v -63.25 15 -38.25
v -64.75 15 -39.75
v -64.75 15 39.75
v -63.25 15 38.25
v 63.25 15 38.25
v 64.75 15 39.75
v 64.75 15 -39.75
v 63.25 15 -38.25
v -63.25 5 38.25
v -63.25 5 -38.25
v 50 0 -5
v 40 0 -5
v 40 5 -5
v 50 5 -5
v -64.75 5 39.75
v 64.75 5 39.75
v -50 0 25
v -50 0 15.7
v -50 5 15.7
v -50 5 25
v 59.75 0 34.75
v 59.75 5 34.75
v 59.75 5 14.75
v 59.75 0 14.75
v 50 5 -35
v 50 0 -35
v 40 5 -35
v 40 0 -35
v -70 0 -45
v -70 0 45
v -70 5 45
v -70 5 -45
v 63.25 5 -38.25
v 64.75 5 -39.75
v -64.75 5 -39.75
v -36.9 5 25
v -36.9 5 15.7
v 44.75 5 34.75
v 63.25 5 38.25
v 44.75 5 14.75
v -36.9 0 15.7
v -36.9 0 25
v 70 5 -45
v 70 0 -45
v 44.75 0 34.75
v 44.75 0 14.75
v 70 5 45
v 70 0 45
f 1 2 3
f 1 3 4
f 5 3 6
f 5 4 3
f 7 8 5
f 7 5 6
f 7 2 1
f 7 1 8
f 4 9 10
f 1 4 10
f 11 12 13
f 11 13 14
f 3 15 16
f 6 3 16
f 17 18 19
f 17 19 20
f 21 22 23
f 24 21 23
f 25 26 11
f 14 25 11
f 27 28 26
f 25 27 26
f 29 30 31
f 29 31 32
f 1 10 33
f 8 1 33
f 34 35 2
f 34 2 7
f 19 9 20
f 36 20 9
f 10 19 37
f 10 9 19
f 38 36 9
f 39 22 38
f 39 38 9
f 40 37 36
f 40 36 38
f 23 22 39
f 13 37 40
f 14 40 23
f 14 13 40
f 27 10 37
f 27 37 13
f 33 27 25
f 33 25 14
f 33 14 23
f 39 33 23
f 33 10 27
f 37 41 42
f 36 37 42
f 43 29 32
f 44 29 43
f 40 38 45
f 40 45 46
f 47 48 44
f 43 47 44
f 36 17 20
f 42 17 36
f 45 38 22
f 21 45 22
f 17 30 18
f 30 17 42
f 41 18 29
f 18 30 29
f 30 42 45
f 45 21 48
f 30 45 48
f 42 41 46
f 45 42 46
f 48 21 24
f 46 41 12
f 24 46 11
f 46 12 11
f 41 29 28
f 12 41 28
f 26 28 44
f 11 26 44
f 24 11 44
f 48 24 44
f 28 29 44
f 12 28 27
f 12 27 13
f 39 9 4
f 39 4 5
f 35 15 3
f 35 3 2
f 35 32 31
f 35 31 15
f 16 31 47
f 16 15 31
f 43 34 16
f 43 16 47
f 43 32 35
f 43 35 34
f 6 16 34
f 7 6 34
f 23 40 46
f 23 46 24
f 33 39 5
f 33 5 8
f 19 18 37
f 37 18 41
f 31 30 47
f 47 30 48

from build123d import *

# Parameters (mm, degrees)
CROQUIS1_W              = 140
CROQUIS1_H              = 90
SALIENTE_EXTRUIR1_DEPTH = 5
CROQUIS2_W              = 129.5
CROQUIS2_H              = 79.5
CROQUIS2_W_2            = 126.5
CROQUIS2_H_2            = 76.5
SALIENTE_EXTRUIR2_DEPTH = 10
CROQUIS3_W              = 15
CROQUIS3_H              = 20
CORTAR_EXTRUIR1_DEPTH   = 84.815273071
CROQUIS4_W              = 13.1
CROQUIS4_H              = 9.3
CORTAR_EXTRUIR2_DEPTH   = 85.557672626
CROQUIS5_W              = 10
CROQUIS5_H              = 30
CORTAR_EXTRUIR3_DEPTH   = 85.557672626


with BuildPart() as part:
    # Croquis1 → Saliente-Extruir1 (new body)
    with BuildSketch(Plane(origin=(0, 0, 0), x_dir=(1, 0, 0), z_dir=(0, 1, 0))):
        Rectangle(CROQUIS1_W, CROQUIS1_H)
    extrude(amount=SALIENTE_EXTRUIR1_DEPTH)

    # Croquis2 → Saliente-Extruir2 (add)
    with BuildSketch(Plane(origin=(0, 5, 0), x_dir=(1, 0, 0), z_dir=(0, 1, 0))):
        Rectangle(CROQUIS2_W, CROQUIS2_H)
        Rectangle(CROQUIS2_W_2, CROQUIS2_H_2, mode=Mode.SUBTRACT)
    extrude(amount=SALIENTE_EXTRUIR2_DEPTH)

    # Croquis3 → Cortar-Extruir1 (cut, through all)
    with BuildSketch(Plane(origin=(0, 5, 0), x_dir=(1, 0, 0), z_dir=(0, 1, 0))):
        with Locations((52.25, -24.75)):
            Rectangle(CROQUIS3_W, CROQUIS3_H)
    extrude(amount=-CORTAR_EXTRUIR1_DEPTH, mode=Mode.SUBTRACT)

    # Croquis4 → Cortar-Extruir2 (cut, through all)
    with BuildSketch(Plane.XZ):
        with Locations((-43.45, 20.35)):
            Rectangle(CROQUIS4_W, CROQUIS4_H)
    extrude(amount=-CORTAR_EXTRUIR2_DEPTH, mode=Mode.SUBTRACT)

    # Croquis5 → Cortar-Extruir3 (cut, through all)
    with BuildSketch(Plane.XZ):
        with Locations((45, -20)):
            Rectangle(CROQUIS5_W, CROQUIS5_H)
    extrude(amount=-CORTAR_EXTRUIR3_DEPTH, mode=Mode.SUBTRACT)


solid = part.part
